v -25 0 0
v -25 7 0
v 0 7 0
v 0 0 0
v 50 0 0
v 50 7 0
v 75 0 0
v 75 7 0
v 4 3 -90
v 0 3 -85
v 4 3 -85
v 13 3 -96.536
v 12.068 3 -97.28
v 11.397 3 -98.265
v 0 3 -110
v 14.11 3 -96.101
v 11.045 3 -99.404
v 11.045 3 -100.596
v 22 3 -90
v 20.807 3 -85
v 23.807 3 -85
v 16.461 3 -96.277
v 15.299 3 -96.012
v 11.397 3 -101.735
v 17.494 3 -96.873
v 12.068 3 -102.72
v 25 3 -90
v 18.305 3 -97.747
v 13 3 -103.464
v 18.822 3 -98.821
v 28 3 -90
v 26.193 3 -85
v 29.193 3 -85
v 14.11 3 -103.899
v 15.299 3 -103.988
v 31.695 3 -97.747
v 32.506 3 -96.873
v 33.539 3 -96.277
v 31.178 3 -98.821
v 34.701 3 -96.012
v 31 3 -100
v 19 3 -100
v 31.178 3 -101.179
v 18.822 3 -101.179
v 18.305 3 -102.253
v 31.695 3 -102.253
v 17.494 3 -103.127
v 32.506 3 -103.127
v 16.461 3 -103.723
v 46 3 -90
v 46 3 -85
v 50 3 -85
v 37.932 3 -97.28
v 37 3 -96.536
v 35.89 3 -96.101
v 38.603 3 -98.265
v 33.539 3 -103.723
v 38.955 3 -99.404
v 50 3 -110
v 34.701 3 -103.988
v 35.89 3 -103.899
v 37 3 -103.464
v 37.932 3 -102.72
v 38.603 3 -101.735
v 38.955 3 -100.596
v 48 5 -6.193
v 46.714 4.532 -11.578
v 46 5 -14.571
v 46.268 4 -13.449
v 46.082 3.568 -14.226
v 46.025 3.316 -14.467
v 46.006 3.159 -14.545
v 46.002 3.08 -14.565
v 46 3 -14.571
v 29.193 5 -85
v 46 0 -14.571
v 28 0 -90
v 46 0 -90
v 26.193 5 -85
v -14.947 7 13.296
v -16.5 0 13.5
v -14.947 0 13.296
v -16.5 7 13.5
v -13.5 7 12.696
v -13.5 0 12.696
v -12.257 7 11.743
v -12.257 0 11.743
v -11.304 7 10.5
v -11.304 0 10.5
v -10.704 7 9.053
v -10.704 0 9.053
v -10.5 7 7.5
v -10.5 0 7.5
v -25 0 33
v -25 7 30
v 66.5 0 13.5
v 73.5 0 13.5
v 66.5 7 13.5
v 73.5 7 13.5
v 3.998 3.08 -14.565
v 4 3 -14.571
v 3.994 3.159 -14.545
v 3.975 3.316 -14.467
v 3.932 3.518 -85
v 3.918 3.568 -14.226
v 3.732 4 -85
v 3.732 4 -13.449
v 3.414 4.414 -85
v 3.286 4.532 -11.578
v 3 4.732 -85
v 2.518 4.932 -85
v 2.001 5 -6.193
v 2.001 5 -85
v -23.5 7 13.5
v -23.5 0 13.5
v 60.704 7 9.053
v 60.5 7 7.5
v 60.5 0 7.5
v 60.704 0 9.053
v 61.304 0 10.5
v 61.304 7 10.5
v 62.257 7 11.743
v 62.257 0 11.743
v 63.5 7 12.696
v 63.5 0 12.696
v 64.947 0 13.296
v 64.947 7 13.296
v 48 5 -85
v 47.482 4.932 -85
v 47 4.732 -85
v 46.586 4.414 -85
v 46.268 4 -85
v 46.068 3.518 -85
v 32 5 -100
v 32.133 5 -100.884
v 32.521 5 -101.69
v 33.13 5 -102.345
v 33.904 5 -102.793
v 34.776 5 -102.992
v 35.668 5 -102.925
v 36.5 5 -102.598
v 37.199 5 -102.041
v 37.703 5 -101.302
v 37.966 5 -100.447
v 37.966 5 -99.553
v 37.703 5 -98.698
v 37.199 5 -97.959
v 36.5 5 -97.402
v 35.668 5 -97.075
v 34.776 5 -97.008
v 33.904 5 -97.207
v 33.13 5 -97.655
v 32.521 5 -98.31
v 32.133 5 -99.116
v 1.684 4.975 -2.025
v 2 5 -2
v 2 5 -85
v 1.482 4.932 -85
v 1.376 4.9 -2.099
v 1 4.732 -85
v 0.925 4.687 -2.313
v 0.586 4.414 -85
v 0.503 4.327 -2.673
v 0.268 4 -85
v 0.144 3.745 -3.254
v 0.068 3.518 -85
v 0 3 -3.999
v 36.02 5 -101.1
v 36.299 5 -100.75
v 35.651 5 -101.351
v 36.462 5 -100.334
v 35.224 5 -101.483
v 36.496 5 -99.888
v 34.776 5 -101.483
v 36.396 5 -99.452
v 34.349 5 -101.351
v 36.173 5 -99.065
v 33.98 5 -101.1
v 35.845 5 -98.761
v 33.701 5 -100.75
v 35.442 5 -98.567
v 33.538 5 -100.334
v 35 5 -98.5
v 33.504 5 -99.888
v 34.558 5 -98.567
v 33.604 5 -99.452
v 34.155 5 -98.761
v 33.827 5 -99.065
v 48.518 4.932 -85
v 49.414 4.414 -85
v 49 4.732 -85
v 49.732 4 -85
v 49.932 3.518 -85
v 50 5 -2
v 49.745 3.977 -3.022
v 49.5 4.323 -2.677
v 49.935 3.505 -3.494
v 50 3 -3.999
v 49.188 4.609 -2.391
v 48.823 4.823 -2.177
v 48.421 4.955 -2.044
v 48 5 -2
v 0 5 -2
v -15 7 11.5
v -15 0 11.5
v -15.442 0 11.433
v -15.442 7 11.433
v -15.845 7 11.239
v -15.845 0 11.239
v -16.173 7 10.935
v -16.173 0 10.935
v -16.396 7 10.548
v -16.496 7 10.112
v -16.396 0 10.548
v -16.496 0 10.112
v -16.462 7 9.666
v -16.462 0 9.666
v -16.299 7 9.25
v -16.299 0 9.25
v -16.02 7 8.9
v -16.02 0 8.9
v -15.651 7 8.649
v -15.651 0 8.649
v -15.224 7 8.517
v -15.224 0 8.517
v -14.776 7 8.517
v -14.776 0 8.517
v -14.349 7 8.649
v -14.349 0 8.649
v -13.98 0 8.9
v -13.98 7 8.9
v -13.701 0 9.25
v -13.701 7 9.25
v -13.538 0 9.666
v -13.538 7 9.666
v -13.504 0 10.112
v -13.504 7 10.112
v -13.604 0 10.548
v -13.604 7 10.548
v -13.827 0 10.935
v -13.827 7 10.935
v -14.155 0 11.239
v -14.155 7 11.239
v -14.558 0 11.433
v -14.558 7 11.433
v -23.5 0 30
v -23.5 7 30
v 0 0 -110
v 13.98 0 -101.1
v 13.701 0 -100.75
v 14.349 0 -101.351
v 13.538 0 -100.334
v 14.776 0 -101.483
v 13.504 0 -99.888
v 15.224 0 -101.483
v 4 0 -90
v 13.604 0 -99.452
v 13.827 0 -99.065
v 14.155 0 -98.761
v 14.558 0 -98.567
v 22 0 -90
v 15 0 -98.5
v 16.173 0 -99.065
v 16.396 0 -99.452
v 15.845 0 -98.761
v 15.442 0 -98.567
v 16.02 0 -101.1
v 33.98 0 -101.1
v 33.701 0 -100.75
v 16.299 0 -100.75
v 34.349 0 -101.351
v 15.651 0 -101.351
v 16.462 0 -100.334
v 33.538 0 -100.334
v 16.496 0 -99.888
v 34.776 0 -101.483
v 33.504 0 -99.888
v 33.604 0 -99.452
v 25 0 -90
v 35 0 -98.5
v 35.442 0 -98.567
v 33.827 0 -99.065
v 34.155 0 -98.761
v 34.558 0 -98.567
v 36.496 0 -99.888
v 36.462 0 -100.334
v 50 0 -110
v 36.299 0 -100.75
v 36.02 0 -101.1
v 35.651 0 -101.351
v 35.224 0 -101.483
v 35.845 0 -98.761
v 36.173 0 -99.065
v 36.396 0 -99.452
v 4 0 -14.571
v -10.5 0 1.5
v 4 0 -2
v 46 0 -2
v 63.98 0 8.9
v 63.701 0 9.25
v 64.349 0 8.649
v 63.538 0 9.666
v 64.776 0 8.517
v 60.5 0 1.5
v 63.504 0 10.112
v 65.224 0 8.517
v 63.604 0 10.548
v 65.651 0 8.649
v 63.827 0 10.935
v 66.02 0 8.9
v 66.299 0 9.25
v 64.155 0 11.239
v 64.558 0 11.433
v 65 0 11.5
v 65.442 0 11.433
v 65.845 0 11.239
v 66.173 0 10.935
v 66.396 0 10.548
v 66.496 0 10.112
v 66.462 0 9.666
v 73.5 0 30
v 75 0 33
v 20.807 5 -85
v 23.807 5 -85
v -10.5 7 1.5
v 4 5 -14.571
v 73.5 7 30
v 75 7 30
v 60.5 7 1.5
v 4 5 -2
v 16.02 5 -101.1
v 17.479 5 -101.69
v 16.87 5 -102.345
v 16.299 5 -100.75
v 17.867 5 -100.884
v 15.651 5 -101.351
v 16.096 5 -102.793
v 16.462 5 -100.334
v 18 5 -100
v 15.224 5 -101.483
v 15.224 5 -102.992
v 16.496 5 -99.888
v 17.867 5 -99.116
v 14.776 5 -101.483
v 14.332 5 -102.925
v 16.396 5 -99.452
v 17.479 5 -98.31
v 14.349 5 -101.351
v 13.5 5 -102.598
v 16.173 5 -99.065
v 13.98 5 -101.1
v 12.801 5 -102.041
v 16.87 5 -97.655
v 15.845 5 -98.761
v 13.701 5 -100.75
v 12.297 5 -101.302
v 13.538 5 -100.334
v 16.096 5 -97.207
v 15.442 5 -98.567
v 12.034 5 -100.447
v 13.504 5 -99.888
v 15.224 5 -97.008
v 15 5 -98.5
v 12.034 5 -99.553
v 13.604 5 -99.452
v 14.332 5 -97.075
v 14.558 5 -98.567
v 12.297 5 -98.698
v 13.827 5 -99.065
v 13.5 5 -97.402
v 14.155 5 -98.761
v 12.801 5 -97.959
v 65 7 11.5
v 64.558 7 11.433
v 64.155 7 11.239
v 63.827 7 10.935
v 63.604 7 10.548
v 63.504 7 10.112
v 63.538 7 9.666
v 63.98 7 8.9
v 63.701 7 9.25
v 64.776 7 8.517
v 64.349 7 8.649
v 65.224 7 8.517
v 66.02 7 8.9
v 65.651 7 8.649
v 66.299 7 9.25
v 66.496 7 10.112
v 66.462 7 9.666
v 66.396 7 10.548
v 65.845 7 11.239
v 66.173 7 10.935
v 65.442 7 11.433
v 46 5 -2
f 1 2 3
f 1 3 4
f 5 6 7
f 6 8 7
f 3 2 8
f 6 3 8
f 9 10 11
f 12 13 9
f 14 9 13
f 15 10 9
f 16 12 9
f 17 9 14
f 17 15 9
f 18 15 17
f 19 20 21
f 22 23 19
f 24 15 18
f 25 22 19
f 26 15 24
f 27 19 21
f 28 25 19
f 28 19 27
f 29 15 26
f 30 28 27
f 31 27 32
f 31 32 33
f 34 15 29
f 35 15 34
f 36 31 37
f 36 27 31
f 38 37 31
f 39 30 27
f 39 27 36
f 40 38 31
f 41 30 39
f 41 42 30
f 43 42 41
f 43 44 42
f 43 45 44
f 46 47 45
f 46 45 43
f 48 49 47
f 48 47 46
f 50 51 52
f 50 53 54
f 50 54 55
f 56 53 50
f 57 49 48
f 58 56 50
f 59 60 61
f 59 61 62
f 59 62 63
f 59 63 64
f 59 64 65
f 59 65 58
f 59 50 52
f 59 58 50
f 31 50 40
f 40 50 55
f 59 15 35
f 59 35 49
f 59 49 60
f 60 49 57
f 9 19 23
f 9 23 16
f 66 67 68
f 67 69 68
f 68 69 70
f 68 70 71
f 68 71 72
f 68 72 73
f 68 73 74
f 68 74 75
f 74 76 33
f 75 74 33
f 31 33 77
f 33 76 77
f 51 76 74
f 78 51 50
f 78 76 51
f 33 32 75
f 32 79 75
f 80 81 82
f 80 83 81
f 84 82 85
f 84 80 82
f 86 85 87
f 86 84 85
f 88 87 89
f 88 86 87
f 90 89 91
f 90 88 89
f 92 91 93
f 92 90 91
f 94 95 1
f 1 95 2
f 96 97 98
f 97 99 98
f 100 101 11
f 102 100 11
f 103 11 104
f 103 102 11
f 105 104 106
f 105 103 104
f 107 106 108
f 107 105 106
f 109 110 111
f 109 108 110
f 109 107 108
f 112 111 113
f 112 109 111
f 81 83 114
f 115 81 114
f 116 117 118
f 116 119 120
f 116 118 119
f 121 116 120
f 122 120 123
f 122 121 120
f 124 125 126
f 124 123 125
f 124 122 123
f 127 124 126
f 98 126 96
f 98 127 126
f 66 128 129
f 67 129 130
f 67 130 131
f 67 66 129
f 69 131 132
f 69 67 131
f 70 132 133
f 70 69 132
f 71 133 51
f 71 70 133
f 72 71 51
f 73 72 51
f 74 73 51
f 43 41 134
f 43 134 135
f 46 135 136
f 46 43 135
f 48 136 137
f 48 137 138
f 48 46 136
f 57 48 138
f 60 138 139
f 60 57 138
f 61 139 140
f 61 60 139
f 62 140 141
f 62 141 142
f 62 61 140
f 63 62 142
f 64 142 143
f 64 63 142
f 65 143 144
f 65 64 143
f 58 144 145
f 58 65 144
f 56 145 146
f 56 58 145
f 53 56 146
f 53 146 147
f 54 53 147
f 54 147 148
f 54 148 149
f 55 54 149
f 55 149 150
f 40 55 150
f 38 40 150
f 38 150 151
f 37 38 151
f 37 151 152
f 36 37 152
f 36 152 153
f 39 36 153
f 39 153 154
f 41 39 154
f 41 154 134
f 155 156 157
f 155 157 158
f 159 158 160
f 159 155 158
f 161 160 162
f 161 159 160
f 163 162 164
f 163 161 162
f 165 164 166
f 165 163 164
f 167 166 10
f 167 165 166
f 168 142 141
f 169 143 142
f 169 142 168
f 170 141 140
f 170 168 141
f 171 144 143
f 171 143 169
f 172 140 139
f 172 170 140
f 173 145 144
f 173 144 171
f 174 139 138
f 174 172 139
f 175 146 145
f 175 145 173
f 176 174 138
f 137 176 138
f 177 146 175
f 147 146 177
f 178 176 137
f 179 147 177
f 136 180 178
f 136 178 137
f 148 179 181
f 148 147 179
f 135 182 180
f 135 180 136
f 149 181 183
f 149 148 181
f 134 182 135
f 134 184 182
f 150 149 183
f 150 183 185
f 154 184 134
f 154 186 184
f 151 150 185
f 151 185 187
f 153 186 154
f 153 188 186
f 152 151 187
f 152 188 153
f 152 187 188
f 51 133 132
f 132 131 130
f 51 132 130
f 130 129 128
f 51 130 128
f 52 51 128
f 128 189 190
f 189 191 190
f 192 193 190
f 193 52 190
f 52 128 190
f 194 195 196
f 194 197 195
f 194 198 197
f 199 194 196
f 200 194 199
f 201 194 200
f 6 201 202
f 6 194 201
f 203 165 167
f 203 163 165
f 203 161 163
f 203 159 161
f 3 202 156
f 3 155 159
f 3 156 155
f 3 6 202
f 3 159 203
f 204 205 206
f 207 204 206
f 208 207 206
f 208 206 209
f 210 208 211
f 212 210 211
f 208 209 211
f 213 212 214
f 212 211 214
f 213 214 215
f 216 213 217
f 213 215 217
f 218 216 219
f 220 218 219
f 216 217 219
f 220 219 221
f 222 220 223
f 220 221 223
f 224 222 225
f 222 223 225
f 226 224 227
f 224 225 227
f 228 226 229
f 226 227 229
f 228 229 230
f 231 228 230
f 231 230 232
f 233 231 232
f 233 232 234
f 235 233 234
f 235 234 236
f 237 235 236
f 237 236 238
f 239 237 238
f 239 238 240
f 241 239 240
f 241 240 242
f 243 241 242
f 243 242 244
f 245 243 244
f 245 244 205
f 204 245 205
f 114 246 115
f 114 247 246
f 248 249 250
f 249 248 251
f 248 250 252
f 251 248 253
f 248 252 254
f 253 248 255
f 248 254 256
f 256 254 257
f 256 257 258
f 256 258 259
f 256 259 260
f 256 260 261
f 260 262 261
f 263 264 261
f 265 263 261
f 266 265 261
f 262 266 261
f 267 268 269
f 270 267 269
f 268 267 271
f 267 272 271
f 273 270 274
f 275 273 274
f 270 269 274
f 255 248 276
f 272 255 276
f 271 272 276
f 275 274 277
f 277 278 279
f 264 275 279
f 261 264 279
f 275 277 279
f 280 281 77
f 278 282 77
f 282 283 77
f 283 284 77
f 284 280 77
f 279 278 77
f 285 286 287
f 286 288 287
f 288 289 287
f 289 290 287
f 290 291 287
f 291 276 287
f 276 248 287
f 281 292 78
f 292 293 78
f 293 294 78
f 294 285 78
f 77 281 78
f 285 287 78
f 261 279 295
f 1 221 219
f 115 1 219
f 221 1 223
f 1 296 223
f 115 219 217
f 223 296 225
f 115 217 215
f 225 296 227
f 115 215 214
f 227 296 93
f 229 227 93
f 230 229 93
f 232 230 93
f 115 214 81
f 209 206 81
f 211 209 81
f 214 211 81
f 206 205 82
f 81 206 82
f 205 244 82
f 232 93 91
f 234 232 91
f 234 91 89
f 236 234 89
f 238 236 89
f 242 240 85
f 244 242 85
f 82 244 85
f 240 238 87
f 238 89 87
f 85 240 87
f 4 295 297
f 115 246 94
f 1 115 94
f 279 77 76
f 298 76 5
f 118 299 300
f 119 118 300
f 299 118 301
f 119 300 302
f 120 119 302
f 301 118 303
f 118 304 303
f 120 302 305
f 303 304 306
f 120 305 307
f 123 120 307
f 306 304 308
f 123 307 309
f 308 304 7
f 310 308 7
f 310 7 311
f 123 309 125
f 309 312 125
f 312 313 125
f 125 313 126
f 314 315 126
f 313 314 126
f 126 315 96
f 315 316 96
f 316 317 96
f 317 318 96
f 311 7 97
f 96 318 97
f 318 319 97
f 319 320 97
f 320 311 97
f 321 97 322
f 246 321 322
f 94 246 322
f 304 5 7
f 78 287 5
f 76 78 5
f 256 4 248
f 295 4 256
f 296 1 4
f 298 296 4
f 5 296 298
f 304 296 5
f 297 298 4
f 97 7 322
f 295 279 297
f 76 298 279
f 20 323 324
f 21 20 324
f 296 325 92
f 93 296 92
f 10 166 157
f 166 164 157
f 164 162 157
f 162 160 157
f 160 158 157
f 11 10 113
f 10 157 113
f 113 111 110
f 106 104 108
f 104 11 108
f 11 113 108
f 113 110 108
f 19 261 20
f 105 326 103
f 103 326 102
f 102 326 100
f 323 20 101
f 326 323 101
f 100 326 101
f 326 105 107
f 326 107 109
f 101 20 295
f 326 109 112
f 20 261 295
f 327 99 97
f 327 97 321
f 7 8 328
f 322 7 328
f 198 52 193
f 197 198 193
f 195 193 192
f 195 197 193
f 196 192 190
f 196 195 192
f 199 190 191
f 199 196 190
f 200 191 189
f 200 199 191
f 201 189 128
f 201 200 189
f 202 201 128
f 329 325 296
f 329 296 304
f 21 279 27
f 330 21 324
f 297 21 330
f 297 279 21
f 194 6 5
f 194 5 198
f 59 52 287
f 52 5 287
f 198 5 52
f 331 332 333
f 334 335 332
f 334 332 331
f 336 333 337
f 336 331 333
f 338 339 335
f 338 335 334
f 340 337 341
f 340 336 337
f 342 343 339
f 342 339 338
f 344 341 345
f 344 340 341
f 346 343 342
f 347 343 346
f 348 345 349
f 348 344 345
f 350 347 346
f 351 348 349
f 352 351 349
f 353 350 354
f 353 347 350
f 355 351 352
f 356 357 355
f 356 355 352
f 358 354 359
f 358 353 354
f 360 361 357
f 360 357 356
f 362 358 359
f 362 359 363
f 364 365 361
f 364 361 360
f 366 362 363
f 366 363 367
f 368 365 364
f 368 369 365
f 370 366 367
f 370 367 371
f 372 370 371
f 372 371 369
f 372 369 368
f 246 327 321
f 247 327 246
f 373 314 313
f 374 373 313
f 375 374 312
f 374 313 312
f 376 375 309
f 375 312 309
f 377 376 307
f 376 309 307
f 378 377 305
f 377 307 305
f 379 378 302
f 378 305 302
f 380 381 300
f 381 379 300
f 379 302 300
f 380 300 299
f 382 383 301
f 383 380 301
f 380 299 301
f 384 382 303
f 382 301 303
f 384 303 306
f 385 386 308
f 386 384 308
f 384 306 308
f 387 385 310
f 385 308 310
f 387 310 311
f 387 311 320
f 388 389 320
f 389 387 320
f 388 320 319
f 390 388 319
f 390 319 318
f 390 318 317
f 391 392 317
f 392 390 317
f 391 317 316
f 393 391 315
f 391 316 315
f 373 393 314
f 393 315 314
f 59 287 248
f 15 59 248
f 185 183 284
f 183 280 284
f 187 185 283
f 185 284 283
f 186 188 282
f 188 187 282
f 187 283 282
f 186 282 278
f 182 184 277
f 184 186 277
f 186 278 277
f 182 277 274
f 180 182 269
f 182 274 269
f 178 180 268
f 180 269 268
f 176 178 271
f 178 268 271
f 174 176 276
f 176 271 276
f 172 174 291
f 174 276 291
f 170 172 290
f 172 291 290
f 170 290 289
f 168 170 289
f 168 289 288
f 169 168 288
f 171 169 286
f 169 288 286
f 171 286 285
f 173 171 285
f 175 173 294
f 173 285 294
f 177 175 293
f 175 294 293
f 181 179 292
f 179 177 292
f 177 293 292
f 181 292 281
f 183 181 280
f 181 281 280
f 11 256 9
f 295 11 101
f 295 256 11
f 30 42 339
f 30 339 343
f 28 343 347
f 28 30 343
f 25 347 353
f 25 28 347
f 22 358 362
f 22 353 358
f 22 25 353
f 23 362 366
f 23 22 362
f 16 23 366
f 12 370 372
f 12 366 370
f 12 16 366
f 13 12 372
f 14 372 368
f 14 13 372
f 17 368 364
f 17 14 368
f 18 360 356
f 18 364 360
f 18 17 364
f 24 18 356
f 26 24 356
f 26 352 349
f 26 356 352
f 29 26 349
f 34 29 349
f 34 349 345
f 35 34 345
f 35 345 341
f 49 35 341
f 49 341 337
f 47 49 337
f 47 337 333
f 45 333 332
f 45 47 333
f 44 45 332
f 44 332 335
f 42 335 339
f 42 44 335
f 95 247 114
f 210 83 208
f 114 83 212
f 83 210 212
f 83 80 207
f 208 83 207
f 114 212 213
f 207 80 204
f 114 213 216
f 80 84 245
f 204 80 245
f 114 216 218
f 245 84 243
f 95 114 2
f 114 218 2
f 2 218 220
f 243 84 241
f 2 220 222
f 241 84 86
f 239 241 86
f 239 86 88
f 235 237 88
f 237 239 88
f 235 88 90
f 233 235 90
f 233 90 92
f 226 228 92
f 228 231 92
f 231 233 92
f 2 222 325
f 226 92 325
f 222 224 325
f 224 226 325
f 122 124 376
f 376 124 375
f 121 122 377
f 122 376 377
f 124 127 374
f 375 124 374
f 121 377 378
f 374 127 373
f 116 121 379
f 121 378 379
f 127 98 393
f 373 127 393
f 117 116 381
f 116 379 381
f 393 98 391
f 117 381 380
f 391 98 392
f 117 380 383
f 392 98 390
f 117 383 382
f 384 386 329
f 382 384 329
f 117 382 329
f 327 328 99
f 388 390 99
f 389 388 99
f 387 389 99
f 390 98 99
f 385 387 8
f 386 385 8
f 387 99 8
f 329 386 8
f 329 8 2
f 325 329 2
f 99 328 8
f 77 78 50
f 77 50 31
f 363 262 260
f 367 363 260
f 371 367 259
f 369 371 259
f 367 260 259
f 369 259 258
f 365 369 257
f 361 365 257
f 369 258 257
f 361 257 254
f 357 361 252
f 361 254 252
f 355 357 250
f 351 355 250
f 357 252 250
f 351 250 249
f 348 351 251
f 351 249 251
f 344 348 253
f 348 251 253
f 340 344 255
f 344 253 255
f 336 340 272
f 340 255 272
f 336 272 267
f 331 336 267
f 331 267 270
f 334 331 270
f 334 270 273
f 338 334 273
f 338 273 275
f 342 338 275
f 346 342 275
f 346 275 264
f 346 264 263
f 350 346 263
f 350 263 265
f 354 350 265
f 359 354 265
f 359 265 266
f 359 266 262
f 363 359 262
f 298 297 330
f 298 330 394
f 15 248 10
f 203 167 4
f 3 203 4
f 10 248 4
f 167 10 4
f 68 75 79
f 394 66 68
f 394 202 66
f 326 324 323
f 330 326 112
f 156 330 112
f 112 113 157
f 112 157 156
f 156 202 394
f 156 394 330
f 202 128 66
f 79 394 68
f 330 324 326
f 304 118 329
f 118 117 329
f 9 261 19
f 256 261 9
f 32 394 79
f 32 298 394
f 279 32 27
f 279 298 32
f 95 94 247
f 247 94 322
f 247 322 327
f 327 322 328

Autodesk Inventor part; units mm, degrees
ref_plane "YZ Plane" through (0, 0, 0) normal (1, 0, 0) x (0, 1, 0)
ref_plane "XZ Plane" through (0, 0, 0) normal (0, 1, 0) x (-1, 0, 0)
sketch "Szkic1" plane through (0, 0, 0) normal (0, 1, 0) x (-1, 0, 0)
  line L0 (0, 0) -> (-25, 0)
  line L1 (-25, 0) -> (-25, -110)
  line L2 (-25, -110) -> (0, -110)
  line L3 (0, -110) -> (0, 0)
  line L4 (-4, -2) -> (-25, -2)
  line L5 (-25, -2) -> (-25, -90)
  line L6 (-25, -90) -> (-4, -90)
  line L7 (-4, -90) -> (-4, -2)
  line L8 (-25, -90) -> (-4, -2)
  line L9 (-22, -90) -> (-4, -14.5714)
  line L10 (-4, -14.5714) -> (-4, -2)
  line L11 (-25, -90) -> (-22, -90)
  dimension "d0" = 25
  dimension "d1" = 110
  dimension "d2" = 4
  dimension "d3" = 20
  dimension "d4" = 2
  dimension "d7" = 3
extrude "Wyciągnięcie proste2" add sketch "Szkic1" along normal blind 5 contours L3 L2 L1 L6 L7 L4 L0 | L8 L7 L9 L6
sketch "Szkic2" plane through (25, 0, 0) normal (1, 0, 0) x (0, 0, -1)
  line L0 (0, 0) -> (-33, 0)
  line L1 (-33, 0) -> (-33, 7)
  line L2 (-33, 7) -> (0, 7)
  line L3 (0, 7) -> (0, 0)
  line L4 (-33, 0) -> (-30, 7)
  dimension "d10" = 33
  dimension "d11" = 7
  dimension "d12" = 30
extrude "Wyciągnięcie proste3" add sketch "Szkic2" against normal blind 50 contours L0 L4 L2 L3
sketch "Szkic3" plane through (25, 7, 30) normal (0, 1, 0) x (1, 0, 0)
  line L0 (0, 0) -> (-50, 0) projected
  line L1 (0, 0) -> (-48.5, 0)
  line L2 (-48.5, 0) -> (-48.5, 28.5)
  line L3 (-48.5, 28.5) -> (0, 28.5)
  line L4 (-50, 0) -> (-50, 30) projected
  line L5 (-48.5, 28.5) -> (-41.5, 28.5)
  line L6 (-41.5, 28.5) -> (-41.5, 16.5)
  line L7 (-41.5, 16.5) -> (-48.5, 16.5)
  line L8 (-48.5, 16.5) -> (-48.5, 28.5)
  circle A0 centre (-41.5, 22.5) radius 6
  line L9 (-35.5, 22.5) -> (-41.5, 22.5)
  line L10 (-41.5, 22.5) -> (-41.5, 28.5)
  line L11 (-41.5, 28.5) -> (-35.5, 28.5)
  line L12 (-35.5, 28.5) -> (-35.5, 22.5)
  line L13 (0, 30) -> (-50, 30) projected
  line L14 (0, 30) -> (0, 0) projected
  line L15 (-19, 28.5) -> (-7, 28.5) construction
  line L16 (-22.5355, 28.5) -> (-19, 28.5)
  line L17 (-7, 28.5) -> (-5, 28.5)
  line L18 (-7, 0) -> (-5, 0)
  point P0 (-25, 30)
  dimension "d16" = 1.5
  dimension "d19" = 13
  dimension "d20" = 12
  dimension "d66" = 1.5
extrude "Wyciągnięcie proste4" cut sketch "Szkic3" against normal up to next contours L0 L2 L7 A0 L12 L3 L14
sketch "Szkic5" plane through (0, 5, 0) normal (0, 1, 0) x (1, 0, 0)
  line L0 (25, 90) -> (25, 110) projected
  line L1 (0, 110) -> (0, 0) projected
  line L2 (25, 110) -> (0, 110)
  line L3 (0, 110) -> (0, 85)
  line L4 (0, 85) -> (25, 85)
  line L5 (25, 85) -> (25, 110)
  circle A0 centre (15, 100) radius 3
  dimension "d30" = 25
  dimension "d31" = 6
  dimension "d32" = 10
  dimension "d33" = 10
extrude "Wyciągnięcie proste6" cut sketch "Szkic5" against normal blind 2
chamfer "Faza2" distance 2 distance2 1 1 edges at (12, 3, -100) measured on face at (17.3983, 3.6667, -98.1978)
chamfer "Faza3" distance 2 angle 45 1 edges at (12.5, 5, 0)
sketch "Szkic6" plane through (15, 5, -100) normal (0, 1, 0) x (1, 0, 0)
  point P0 (-15, -100)
  point P1 (0, 0)
hole "Otwór1" at (15, 5, -100) direction (0, -1, 0) diameter 3 end through all
sketch "Szkic7" plane through (-25, 7, 30) normal (0, 1, 0) x (1, 0, 0)
  line L0 (14.5, 28.5) -> (14.5, 22.5) construction
  line L1 (14.5, 28.5) -> (14.5, 20) construction
  line L2 (14.5, 20) -> (1.5, 20) construction
  line L3 (1.5, 16.5) -> (1.5, 0) construction
  line L4 (1.5, 20) -> (1.5, 16.5) construction
  line L5 (1.5, 20) -> (10, 20) construction
  point P0 (25, 30)
  point P1 (14.5, 22.5)
  point P2 (12.5, 27.5)
  dimension "d49" = 8.5
  dimension "d50" = 8.5
hole "Otwór2" at (-15, 7, 10) direction (0, -1, 0) diameter 3 end through all
ref_plane "Płaszczyzna konstrukcyjna1" through (25, 3, -48.75) normal (1, 0, 0) x (0, 0, 1)
mirror "Odbij1" about plane through (25, 3, -48.75) normal (1, 0, 0)
fillet "Fillet1" radius 2 4 edges at (4, 5, -49.7857) (0, 5, -43.4998) (46, 5, -49.7857) (50, 5, -43.4998)
properties part number "lf20cm"
